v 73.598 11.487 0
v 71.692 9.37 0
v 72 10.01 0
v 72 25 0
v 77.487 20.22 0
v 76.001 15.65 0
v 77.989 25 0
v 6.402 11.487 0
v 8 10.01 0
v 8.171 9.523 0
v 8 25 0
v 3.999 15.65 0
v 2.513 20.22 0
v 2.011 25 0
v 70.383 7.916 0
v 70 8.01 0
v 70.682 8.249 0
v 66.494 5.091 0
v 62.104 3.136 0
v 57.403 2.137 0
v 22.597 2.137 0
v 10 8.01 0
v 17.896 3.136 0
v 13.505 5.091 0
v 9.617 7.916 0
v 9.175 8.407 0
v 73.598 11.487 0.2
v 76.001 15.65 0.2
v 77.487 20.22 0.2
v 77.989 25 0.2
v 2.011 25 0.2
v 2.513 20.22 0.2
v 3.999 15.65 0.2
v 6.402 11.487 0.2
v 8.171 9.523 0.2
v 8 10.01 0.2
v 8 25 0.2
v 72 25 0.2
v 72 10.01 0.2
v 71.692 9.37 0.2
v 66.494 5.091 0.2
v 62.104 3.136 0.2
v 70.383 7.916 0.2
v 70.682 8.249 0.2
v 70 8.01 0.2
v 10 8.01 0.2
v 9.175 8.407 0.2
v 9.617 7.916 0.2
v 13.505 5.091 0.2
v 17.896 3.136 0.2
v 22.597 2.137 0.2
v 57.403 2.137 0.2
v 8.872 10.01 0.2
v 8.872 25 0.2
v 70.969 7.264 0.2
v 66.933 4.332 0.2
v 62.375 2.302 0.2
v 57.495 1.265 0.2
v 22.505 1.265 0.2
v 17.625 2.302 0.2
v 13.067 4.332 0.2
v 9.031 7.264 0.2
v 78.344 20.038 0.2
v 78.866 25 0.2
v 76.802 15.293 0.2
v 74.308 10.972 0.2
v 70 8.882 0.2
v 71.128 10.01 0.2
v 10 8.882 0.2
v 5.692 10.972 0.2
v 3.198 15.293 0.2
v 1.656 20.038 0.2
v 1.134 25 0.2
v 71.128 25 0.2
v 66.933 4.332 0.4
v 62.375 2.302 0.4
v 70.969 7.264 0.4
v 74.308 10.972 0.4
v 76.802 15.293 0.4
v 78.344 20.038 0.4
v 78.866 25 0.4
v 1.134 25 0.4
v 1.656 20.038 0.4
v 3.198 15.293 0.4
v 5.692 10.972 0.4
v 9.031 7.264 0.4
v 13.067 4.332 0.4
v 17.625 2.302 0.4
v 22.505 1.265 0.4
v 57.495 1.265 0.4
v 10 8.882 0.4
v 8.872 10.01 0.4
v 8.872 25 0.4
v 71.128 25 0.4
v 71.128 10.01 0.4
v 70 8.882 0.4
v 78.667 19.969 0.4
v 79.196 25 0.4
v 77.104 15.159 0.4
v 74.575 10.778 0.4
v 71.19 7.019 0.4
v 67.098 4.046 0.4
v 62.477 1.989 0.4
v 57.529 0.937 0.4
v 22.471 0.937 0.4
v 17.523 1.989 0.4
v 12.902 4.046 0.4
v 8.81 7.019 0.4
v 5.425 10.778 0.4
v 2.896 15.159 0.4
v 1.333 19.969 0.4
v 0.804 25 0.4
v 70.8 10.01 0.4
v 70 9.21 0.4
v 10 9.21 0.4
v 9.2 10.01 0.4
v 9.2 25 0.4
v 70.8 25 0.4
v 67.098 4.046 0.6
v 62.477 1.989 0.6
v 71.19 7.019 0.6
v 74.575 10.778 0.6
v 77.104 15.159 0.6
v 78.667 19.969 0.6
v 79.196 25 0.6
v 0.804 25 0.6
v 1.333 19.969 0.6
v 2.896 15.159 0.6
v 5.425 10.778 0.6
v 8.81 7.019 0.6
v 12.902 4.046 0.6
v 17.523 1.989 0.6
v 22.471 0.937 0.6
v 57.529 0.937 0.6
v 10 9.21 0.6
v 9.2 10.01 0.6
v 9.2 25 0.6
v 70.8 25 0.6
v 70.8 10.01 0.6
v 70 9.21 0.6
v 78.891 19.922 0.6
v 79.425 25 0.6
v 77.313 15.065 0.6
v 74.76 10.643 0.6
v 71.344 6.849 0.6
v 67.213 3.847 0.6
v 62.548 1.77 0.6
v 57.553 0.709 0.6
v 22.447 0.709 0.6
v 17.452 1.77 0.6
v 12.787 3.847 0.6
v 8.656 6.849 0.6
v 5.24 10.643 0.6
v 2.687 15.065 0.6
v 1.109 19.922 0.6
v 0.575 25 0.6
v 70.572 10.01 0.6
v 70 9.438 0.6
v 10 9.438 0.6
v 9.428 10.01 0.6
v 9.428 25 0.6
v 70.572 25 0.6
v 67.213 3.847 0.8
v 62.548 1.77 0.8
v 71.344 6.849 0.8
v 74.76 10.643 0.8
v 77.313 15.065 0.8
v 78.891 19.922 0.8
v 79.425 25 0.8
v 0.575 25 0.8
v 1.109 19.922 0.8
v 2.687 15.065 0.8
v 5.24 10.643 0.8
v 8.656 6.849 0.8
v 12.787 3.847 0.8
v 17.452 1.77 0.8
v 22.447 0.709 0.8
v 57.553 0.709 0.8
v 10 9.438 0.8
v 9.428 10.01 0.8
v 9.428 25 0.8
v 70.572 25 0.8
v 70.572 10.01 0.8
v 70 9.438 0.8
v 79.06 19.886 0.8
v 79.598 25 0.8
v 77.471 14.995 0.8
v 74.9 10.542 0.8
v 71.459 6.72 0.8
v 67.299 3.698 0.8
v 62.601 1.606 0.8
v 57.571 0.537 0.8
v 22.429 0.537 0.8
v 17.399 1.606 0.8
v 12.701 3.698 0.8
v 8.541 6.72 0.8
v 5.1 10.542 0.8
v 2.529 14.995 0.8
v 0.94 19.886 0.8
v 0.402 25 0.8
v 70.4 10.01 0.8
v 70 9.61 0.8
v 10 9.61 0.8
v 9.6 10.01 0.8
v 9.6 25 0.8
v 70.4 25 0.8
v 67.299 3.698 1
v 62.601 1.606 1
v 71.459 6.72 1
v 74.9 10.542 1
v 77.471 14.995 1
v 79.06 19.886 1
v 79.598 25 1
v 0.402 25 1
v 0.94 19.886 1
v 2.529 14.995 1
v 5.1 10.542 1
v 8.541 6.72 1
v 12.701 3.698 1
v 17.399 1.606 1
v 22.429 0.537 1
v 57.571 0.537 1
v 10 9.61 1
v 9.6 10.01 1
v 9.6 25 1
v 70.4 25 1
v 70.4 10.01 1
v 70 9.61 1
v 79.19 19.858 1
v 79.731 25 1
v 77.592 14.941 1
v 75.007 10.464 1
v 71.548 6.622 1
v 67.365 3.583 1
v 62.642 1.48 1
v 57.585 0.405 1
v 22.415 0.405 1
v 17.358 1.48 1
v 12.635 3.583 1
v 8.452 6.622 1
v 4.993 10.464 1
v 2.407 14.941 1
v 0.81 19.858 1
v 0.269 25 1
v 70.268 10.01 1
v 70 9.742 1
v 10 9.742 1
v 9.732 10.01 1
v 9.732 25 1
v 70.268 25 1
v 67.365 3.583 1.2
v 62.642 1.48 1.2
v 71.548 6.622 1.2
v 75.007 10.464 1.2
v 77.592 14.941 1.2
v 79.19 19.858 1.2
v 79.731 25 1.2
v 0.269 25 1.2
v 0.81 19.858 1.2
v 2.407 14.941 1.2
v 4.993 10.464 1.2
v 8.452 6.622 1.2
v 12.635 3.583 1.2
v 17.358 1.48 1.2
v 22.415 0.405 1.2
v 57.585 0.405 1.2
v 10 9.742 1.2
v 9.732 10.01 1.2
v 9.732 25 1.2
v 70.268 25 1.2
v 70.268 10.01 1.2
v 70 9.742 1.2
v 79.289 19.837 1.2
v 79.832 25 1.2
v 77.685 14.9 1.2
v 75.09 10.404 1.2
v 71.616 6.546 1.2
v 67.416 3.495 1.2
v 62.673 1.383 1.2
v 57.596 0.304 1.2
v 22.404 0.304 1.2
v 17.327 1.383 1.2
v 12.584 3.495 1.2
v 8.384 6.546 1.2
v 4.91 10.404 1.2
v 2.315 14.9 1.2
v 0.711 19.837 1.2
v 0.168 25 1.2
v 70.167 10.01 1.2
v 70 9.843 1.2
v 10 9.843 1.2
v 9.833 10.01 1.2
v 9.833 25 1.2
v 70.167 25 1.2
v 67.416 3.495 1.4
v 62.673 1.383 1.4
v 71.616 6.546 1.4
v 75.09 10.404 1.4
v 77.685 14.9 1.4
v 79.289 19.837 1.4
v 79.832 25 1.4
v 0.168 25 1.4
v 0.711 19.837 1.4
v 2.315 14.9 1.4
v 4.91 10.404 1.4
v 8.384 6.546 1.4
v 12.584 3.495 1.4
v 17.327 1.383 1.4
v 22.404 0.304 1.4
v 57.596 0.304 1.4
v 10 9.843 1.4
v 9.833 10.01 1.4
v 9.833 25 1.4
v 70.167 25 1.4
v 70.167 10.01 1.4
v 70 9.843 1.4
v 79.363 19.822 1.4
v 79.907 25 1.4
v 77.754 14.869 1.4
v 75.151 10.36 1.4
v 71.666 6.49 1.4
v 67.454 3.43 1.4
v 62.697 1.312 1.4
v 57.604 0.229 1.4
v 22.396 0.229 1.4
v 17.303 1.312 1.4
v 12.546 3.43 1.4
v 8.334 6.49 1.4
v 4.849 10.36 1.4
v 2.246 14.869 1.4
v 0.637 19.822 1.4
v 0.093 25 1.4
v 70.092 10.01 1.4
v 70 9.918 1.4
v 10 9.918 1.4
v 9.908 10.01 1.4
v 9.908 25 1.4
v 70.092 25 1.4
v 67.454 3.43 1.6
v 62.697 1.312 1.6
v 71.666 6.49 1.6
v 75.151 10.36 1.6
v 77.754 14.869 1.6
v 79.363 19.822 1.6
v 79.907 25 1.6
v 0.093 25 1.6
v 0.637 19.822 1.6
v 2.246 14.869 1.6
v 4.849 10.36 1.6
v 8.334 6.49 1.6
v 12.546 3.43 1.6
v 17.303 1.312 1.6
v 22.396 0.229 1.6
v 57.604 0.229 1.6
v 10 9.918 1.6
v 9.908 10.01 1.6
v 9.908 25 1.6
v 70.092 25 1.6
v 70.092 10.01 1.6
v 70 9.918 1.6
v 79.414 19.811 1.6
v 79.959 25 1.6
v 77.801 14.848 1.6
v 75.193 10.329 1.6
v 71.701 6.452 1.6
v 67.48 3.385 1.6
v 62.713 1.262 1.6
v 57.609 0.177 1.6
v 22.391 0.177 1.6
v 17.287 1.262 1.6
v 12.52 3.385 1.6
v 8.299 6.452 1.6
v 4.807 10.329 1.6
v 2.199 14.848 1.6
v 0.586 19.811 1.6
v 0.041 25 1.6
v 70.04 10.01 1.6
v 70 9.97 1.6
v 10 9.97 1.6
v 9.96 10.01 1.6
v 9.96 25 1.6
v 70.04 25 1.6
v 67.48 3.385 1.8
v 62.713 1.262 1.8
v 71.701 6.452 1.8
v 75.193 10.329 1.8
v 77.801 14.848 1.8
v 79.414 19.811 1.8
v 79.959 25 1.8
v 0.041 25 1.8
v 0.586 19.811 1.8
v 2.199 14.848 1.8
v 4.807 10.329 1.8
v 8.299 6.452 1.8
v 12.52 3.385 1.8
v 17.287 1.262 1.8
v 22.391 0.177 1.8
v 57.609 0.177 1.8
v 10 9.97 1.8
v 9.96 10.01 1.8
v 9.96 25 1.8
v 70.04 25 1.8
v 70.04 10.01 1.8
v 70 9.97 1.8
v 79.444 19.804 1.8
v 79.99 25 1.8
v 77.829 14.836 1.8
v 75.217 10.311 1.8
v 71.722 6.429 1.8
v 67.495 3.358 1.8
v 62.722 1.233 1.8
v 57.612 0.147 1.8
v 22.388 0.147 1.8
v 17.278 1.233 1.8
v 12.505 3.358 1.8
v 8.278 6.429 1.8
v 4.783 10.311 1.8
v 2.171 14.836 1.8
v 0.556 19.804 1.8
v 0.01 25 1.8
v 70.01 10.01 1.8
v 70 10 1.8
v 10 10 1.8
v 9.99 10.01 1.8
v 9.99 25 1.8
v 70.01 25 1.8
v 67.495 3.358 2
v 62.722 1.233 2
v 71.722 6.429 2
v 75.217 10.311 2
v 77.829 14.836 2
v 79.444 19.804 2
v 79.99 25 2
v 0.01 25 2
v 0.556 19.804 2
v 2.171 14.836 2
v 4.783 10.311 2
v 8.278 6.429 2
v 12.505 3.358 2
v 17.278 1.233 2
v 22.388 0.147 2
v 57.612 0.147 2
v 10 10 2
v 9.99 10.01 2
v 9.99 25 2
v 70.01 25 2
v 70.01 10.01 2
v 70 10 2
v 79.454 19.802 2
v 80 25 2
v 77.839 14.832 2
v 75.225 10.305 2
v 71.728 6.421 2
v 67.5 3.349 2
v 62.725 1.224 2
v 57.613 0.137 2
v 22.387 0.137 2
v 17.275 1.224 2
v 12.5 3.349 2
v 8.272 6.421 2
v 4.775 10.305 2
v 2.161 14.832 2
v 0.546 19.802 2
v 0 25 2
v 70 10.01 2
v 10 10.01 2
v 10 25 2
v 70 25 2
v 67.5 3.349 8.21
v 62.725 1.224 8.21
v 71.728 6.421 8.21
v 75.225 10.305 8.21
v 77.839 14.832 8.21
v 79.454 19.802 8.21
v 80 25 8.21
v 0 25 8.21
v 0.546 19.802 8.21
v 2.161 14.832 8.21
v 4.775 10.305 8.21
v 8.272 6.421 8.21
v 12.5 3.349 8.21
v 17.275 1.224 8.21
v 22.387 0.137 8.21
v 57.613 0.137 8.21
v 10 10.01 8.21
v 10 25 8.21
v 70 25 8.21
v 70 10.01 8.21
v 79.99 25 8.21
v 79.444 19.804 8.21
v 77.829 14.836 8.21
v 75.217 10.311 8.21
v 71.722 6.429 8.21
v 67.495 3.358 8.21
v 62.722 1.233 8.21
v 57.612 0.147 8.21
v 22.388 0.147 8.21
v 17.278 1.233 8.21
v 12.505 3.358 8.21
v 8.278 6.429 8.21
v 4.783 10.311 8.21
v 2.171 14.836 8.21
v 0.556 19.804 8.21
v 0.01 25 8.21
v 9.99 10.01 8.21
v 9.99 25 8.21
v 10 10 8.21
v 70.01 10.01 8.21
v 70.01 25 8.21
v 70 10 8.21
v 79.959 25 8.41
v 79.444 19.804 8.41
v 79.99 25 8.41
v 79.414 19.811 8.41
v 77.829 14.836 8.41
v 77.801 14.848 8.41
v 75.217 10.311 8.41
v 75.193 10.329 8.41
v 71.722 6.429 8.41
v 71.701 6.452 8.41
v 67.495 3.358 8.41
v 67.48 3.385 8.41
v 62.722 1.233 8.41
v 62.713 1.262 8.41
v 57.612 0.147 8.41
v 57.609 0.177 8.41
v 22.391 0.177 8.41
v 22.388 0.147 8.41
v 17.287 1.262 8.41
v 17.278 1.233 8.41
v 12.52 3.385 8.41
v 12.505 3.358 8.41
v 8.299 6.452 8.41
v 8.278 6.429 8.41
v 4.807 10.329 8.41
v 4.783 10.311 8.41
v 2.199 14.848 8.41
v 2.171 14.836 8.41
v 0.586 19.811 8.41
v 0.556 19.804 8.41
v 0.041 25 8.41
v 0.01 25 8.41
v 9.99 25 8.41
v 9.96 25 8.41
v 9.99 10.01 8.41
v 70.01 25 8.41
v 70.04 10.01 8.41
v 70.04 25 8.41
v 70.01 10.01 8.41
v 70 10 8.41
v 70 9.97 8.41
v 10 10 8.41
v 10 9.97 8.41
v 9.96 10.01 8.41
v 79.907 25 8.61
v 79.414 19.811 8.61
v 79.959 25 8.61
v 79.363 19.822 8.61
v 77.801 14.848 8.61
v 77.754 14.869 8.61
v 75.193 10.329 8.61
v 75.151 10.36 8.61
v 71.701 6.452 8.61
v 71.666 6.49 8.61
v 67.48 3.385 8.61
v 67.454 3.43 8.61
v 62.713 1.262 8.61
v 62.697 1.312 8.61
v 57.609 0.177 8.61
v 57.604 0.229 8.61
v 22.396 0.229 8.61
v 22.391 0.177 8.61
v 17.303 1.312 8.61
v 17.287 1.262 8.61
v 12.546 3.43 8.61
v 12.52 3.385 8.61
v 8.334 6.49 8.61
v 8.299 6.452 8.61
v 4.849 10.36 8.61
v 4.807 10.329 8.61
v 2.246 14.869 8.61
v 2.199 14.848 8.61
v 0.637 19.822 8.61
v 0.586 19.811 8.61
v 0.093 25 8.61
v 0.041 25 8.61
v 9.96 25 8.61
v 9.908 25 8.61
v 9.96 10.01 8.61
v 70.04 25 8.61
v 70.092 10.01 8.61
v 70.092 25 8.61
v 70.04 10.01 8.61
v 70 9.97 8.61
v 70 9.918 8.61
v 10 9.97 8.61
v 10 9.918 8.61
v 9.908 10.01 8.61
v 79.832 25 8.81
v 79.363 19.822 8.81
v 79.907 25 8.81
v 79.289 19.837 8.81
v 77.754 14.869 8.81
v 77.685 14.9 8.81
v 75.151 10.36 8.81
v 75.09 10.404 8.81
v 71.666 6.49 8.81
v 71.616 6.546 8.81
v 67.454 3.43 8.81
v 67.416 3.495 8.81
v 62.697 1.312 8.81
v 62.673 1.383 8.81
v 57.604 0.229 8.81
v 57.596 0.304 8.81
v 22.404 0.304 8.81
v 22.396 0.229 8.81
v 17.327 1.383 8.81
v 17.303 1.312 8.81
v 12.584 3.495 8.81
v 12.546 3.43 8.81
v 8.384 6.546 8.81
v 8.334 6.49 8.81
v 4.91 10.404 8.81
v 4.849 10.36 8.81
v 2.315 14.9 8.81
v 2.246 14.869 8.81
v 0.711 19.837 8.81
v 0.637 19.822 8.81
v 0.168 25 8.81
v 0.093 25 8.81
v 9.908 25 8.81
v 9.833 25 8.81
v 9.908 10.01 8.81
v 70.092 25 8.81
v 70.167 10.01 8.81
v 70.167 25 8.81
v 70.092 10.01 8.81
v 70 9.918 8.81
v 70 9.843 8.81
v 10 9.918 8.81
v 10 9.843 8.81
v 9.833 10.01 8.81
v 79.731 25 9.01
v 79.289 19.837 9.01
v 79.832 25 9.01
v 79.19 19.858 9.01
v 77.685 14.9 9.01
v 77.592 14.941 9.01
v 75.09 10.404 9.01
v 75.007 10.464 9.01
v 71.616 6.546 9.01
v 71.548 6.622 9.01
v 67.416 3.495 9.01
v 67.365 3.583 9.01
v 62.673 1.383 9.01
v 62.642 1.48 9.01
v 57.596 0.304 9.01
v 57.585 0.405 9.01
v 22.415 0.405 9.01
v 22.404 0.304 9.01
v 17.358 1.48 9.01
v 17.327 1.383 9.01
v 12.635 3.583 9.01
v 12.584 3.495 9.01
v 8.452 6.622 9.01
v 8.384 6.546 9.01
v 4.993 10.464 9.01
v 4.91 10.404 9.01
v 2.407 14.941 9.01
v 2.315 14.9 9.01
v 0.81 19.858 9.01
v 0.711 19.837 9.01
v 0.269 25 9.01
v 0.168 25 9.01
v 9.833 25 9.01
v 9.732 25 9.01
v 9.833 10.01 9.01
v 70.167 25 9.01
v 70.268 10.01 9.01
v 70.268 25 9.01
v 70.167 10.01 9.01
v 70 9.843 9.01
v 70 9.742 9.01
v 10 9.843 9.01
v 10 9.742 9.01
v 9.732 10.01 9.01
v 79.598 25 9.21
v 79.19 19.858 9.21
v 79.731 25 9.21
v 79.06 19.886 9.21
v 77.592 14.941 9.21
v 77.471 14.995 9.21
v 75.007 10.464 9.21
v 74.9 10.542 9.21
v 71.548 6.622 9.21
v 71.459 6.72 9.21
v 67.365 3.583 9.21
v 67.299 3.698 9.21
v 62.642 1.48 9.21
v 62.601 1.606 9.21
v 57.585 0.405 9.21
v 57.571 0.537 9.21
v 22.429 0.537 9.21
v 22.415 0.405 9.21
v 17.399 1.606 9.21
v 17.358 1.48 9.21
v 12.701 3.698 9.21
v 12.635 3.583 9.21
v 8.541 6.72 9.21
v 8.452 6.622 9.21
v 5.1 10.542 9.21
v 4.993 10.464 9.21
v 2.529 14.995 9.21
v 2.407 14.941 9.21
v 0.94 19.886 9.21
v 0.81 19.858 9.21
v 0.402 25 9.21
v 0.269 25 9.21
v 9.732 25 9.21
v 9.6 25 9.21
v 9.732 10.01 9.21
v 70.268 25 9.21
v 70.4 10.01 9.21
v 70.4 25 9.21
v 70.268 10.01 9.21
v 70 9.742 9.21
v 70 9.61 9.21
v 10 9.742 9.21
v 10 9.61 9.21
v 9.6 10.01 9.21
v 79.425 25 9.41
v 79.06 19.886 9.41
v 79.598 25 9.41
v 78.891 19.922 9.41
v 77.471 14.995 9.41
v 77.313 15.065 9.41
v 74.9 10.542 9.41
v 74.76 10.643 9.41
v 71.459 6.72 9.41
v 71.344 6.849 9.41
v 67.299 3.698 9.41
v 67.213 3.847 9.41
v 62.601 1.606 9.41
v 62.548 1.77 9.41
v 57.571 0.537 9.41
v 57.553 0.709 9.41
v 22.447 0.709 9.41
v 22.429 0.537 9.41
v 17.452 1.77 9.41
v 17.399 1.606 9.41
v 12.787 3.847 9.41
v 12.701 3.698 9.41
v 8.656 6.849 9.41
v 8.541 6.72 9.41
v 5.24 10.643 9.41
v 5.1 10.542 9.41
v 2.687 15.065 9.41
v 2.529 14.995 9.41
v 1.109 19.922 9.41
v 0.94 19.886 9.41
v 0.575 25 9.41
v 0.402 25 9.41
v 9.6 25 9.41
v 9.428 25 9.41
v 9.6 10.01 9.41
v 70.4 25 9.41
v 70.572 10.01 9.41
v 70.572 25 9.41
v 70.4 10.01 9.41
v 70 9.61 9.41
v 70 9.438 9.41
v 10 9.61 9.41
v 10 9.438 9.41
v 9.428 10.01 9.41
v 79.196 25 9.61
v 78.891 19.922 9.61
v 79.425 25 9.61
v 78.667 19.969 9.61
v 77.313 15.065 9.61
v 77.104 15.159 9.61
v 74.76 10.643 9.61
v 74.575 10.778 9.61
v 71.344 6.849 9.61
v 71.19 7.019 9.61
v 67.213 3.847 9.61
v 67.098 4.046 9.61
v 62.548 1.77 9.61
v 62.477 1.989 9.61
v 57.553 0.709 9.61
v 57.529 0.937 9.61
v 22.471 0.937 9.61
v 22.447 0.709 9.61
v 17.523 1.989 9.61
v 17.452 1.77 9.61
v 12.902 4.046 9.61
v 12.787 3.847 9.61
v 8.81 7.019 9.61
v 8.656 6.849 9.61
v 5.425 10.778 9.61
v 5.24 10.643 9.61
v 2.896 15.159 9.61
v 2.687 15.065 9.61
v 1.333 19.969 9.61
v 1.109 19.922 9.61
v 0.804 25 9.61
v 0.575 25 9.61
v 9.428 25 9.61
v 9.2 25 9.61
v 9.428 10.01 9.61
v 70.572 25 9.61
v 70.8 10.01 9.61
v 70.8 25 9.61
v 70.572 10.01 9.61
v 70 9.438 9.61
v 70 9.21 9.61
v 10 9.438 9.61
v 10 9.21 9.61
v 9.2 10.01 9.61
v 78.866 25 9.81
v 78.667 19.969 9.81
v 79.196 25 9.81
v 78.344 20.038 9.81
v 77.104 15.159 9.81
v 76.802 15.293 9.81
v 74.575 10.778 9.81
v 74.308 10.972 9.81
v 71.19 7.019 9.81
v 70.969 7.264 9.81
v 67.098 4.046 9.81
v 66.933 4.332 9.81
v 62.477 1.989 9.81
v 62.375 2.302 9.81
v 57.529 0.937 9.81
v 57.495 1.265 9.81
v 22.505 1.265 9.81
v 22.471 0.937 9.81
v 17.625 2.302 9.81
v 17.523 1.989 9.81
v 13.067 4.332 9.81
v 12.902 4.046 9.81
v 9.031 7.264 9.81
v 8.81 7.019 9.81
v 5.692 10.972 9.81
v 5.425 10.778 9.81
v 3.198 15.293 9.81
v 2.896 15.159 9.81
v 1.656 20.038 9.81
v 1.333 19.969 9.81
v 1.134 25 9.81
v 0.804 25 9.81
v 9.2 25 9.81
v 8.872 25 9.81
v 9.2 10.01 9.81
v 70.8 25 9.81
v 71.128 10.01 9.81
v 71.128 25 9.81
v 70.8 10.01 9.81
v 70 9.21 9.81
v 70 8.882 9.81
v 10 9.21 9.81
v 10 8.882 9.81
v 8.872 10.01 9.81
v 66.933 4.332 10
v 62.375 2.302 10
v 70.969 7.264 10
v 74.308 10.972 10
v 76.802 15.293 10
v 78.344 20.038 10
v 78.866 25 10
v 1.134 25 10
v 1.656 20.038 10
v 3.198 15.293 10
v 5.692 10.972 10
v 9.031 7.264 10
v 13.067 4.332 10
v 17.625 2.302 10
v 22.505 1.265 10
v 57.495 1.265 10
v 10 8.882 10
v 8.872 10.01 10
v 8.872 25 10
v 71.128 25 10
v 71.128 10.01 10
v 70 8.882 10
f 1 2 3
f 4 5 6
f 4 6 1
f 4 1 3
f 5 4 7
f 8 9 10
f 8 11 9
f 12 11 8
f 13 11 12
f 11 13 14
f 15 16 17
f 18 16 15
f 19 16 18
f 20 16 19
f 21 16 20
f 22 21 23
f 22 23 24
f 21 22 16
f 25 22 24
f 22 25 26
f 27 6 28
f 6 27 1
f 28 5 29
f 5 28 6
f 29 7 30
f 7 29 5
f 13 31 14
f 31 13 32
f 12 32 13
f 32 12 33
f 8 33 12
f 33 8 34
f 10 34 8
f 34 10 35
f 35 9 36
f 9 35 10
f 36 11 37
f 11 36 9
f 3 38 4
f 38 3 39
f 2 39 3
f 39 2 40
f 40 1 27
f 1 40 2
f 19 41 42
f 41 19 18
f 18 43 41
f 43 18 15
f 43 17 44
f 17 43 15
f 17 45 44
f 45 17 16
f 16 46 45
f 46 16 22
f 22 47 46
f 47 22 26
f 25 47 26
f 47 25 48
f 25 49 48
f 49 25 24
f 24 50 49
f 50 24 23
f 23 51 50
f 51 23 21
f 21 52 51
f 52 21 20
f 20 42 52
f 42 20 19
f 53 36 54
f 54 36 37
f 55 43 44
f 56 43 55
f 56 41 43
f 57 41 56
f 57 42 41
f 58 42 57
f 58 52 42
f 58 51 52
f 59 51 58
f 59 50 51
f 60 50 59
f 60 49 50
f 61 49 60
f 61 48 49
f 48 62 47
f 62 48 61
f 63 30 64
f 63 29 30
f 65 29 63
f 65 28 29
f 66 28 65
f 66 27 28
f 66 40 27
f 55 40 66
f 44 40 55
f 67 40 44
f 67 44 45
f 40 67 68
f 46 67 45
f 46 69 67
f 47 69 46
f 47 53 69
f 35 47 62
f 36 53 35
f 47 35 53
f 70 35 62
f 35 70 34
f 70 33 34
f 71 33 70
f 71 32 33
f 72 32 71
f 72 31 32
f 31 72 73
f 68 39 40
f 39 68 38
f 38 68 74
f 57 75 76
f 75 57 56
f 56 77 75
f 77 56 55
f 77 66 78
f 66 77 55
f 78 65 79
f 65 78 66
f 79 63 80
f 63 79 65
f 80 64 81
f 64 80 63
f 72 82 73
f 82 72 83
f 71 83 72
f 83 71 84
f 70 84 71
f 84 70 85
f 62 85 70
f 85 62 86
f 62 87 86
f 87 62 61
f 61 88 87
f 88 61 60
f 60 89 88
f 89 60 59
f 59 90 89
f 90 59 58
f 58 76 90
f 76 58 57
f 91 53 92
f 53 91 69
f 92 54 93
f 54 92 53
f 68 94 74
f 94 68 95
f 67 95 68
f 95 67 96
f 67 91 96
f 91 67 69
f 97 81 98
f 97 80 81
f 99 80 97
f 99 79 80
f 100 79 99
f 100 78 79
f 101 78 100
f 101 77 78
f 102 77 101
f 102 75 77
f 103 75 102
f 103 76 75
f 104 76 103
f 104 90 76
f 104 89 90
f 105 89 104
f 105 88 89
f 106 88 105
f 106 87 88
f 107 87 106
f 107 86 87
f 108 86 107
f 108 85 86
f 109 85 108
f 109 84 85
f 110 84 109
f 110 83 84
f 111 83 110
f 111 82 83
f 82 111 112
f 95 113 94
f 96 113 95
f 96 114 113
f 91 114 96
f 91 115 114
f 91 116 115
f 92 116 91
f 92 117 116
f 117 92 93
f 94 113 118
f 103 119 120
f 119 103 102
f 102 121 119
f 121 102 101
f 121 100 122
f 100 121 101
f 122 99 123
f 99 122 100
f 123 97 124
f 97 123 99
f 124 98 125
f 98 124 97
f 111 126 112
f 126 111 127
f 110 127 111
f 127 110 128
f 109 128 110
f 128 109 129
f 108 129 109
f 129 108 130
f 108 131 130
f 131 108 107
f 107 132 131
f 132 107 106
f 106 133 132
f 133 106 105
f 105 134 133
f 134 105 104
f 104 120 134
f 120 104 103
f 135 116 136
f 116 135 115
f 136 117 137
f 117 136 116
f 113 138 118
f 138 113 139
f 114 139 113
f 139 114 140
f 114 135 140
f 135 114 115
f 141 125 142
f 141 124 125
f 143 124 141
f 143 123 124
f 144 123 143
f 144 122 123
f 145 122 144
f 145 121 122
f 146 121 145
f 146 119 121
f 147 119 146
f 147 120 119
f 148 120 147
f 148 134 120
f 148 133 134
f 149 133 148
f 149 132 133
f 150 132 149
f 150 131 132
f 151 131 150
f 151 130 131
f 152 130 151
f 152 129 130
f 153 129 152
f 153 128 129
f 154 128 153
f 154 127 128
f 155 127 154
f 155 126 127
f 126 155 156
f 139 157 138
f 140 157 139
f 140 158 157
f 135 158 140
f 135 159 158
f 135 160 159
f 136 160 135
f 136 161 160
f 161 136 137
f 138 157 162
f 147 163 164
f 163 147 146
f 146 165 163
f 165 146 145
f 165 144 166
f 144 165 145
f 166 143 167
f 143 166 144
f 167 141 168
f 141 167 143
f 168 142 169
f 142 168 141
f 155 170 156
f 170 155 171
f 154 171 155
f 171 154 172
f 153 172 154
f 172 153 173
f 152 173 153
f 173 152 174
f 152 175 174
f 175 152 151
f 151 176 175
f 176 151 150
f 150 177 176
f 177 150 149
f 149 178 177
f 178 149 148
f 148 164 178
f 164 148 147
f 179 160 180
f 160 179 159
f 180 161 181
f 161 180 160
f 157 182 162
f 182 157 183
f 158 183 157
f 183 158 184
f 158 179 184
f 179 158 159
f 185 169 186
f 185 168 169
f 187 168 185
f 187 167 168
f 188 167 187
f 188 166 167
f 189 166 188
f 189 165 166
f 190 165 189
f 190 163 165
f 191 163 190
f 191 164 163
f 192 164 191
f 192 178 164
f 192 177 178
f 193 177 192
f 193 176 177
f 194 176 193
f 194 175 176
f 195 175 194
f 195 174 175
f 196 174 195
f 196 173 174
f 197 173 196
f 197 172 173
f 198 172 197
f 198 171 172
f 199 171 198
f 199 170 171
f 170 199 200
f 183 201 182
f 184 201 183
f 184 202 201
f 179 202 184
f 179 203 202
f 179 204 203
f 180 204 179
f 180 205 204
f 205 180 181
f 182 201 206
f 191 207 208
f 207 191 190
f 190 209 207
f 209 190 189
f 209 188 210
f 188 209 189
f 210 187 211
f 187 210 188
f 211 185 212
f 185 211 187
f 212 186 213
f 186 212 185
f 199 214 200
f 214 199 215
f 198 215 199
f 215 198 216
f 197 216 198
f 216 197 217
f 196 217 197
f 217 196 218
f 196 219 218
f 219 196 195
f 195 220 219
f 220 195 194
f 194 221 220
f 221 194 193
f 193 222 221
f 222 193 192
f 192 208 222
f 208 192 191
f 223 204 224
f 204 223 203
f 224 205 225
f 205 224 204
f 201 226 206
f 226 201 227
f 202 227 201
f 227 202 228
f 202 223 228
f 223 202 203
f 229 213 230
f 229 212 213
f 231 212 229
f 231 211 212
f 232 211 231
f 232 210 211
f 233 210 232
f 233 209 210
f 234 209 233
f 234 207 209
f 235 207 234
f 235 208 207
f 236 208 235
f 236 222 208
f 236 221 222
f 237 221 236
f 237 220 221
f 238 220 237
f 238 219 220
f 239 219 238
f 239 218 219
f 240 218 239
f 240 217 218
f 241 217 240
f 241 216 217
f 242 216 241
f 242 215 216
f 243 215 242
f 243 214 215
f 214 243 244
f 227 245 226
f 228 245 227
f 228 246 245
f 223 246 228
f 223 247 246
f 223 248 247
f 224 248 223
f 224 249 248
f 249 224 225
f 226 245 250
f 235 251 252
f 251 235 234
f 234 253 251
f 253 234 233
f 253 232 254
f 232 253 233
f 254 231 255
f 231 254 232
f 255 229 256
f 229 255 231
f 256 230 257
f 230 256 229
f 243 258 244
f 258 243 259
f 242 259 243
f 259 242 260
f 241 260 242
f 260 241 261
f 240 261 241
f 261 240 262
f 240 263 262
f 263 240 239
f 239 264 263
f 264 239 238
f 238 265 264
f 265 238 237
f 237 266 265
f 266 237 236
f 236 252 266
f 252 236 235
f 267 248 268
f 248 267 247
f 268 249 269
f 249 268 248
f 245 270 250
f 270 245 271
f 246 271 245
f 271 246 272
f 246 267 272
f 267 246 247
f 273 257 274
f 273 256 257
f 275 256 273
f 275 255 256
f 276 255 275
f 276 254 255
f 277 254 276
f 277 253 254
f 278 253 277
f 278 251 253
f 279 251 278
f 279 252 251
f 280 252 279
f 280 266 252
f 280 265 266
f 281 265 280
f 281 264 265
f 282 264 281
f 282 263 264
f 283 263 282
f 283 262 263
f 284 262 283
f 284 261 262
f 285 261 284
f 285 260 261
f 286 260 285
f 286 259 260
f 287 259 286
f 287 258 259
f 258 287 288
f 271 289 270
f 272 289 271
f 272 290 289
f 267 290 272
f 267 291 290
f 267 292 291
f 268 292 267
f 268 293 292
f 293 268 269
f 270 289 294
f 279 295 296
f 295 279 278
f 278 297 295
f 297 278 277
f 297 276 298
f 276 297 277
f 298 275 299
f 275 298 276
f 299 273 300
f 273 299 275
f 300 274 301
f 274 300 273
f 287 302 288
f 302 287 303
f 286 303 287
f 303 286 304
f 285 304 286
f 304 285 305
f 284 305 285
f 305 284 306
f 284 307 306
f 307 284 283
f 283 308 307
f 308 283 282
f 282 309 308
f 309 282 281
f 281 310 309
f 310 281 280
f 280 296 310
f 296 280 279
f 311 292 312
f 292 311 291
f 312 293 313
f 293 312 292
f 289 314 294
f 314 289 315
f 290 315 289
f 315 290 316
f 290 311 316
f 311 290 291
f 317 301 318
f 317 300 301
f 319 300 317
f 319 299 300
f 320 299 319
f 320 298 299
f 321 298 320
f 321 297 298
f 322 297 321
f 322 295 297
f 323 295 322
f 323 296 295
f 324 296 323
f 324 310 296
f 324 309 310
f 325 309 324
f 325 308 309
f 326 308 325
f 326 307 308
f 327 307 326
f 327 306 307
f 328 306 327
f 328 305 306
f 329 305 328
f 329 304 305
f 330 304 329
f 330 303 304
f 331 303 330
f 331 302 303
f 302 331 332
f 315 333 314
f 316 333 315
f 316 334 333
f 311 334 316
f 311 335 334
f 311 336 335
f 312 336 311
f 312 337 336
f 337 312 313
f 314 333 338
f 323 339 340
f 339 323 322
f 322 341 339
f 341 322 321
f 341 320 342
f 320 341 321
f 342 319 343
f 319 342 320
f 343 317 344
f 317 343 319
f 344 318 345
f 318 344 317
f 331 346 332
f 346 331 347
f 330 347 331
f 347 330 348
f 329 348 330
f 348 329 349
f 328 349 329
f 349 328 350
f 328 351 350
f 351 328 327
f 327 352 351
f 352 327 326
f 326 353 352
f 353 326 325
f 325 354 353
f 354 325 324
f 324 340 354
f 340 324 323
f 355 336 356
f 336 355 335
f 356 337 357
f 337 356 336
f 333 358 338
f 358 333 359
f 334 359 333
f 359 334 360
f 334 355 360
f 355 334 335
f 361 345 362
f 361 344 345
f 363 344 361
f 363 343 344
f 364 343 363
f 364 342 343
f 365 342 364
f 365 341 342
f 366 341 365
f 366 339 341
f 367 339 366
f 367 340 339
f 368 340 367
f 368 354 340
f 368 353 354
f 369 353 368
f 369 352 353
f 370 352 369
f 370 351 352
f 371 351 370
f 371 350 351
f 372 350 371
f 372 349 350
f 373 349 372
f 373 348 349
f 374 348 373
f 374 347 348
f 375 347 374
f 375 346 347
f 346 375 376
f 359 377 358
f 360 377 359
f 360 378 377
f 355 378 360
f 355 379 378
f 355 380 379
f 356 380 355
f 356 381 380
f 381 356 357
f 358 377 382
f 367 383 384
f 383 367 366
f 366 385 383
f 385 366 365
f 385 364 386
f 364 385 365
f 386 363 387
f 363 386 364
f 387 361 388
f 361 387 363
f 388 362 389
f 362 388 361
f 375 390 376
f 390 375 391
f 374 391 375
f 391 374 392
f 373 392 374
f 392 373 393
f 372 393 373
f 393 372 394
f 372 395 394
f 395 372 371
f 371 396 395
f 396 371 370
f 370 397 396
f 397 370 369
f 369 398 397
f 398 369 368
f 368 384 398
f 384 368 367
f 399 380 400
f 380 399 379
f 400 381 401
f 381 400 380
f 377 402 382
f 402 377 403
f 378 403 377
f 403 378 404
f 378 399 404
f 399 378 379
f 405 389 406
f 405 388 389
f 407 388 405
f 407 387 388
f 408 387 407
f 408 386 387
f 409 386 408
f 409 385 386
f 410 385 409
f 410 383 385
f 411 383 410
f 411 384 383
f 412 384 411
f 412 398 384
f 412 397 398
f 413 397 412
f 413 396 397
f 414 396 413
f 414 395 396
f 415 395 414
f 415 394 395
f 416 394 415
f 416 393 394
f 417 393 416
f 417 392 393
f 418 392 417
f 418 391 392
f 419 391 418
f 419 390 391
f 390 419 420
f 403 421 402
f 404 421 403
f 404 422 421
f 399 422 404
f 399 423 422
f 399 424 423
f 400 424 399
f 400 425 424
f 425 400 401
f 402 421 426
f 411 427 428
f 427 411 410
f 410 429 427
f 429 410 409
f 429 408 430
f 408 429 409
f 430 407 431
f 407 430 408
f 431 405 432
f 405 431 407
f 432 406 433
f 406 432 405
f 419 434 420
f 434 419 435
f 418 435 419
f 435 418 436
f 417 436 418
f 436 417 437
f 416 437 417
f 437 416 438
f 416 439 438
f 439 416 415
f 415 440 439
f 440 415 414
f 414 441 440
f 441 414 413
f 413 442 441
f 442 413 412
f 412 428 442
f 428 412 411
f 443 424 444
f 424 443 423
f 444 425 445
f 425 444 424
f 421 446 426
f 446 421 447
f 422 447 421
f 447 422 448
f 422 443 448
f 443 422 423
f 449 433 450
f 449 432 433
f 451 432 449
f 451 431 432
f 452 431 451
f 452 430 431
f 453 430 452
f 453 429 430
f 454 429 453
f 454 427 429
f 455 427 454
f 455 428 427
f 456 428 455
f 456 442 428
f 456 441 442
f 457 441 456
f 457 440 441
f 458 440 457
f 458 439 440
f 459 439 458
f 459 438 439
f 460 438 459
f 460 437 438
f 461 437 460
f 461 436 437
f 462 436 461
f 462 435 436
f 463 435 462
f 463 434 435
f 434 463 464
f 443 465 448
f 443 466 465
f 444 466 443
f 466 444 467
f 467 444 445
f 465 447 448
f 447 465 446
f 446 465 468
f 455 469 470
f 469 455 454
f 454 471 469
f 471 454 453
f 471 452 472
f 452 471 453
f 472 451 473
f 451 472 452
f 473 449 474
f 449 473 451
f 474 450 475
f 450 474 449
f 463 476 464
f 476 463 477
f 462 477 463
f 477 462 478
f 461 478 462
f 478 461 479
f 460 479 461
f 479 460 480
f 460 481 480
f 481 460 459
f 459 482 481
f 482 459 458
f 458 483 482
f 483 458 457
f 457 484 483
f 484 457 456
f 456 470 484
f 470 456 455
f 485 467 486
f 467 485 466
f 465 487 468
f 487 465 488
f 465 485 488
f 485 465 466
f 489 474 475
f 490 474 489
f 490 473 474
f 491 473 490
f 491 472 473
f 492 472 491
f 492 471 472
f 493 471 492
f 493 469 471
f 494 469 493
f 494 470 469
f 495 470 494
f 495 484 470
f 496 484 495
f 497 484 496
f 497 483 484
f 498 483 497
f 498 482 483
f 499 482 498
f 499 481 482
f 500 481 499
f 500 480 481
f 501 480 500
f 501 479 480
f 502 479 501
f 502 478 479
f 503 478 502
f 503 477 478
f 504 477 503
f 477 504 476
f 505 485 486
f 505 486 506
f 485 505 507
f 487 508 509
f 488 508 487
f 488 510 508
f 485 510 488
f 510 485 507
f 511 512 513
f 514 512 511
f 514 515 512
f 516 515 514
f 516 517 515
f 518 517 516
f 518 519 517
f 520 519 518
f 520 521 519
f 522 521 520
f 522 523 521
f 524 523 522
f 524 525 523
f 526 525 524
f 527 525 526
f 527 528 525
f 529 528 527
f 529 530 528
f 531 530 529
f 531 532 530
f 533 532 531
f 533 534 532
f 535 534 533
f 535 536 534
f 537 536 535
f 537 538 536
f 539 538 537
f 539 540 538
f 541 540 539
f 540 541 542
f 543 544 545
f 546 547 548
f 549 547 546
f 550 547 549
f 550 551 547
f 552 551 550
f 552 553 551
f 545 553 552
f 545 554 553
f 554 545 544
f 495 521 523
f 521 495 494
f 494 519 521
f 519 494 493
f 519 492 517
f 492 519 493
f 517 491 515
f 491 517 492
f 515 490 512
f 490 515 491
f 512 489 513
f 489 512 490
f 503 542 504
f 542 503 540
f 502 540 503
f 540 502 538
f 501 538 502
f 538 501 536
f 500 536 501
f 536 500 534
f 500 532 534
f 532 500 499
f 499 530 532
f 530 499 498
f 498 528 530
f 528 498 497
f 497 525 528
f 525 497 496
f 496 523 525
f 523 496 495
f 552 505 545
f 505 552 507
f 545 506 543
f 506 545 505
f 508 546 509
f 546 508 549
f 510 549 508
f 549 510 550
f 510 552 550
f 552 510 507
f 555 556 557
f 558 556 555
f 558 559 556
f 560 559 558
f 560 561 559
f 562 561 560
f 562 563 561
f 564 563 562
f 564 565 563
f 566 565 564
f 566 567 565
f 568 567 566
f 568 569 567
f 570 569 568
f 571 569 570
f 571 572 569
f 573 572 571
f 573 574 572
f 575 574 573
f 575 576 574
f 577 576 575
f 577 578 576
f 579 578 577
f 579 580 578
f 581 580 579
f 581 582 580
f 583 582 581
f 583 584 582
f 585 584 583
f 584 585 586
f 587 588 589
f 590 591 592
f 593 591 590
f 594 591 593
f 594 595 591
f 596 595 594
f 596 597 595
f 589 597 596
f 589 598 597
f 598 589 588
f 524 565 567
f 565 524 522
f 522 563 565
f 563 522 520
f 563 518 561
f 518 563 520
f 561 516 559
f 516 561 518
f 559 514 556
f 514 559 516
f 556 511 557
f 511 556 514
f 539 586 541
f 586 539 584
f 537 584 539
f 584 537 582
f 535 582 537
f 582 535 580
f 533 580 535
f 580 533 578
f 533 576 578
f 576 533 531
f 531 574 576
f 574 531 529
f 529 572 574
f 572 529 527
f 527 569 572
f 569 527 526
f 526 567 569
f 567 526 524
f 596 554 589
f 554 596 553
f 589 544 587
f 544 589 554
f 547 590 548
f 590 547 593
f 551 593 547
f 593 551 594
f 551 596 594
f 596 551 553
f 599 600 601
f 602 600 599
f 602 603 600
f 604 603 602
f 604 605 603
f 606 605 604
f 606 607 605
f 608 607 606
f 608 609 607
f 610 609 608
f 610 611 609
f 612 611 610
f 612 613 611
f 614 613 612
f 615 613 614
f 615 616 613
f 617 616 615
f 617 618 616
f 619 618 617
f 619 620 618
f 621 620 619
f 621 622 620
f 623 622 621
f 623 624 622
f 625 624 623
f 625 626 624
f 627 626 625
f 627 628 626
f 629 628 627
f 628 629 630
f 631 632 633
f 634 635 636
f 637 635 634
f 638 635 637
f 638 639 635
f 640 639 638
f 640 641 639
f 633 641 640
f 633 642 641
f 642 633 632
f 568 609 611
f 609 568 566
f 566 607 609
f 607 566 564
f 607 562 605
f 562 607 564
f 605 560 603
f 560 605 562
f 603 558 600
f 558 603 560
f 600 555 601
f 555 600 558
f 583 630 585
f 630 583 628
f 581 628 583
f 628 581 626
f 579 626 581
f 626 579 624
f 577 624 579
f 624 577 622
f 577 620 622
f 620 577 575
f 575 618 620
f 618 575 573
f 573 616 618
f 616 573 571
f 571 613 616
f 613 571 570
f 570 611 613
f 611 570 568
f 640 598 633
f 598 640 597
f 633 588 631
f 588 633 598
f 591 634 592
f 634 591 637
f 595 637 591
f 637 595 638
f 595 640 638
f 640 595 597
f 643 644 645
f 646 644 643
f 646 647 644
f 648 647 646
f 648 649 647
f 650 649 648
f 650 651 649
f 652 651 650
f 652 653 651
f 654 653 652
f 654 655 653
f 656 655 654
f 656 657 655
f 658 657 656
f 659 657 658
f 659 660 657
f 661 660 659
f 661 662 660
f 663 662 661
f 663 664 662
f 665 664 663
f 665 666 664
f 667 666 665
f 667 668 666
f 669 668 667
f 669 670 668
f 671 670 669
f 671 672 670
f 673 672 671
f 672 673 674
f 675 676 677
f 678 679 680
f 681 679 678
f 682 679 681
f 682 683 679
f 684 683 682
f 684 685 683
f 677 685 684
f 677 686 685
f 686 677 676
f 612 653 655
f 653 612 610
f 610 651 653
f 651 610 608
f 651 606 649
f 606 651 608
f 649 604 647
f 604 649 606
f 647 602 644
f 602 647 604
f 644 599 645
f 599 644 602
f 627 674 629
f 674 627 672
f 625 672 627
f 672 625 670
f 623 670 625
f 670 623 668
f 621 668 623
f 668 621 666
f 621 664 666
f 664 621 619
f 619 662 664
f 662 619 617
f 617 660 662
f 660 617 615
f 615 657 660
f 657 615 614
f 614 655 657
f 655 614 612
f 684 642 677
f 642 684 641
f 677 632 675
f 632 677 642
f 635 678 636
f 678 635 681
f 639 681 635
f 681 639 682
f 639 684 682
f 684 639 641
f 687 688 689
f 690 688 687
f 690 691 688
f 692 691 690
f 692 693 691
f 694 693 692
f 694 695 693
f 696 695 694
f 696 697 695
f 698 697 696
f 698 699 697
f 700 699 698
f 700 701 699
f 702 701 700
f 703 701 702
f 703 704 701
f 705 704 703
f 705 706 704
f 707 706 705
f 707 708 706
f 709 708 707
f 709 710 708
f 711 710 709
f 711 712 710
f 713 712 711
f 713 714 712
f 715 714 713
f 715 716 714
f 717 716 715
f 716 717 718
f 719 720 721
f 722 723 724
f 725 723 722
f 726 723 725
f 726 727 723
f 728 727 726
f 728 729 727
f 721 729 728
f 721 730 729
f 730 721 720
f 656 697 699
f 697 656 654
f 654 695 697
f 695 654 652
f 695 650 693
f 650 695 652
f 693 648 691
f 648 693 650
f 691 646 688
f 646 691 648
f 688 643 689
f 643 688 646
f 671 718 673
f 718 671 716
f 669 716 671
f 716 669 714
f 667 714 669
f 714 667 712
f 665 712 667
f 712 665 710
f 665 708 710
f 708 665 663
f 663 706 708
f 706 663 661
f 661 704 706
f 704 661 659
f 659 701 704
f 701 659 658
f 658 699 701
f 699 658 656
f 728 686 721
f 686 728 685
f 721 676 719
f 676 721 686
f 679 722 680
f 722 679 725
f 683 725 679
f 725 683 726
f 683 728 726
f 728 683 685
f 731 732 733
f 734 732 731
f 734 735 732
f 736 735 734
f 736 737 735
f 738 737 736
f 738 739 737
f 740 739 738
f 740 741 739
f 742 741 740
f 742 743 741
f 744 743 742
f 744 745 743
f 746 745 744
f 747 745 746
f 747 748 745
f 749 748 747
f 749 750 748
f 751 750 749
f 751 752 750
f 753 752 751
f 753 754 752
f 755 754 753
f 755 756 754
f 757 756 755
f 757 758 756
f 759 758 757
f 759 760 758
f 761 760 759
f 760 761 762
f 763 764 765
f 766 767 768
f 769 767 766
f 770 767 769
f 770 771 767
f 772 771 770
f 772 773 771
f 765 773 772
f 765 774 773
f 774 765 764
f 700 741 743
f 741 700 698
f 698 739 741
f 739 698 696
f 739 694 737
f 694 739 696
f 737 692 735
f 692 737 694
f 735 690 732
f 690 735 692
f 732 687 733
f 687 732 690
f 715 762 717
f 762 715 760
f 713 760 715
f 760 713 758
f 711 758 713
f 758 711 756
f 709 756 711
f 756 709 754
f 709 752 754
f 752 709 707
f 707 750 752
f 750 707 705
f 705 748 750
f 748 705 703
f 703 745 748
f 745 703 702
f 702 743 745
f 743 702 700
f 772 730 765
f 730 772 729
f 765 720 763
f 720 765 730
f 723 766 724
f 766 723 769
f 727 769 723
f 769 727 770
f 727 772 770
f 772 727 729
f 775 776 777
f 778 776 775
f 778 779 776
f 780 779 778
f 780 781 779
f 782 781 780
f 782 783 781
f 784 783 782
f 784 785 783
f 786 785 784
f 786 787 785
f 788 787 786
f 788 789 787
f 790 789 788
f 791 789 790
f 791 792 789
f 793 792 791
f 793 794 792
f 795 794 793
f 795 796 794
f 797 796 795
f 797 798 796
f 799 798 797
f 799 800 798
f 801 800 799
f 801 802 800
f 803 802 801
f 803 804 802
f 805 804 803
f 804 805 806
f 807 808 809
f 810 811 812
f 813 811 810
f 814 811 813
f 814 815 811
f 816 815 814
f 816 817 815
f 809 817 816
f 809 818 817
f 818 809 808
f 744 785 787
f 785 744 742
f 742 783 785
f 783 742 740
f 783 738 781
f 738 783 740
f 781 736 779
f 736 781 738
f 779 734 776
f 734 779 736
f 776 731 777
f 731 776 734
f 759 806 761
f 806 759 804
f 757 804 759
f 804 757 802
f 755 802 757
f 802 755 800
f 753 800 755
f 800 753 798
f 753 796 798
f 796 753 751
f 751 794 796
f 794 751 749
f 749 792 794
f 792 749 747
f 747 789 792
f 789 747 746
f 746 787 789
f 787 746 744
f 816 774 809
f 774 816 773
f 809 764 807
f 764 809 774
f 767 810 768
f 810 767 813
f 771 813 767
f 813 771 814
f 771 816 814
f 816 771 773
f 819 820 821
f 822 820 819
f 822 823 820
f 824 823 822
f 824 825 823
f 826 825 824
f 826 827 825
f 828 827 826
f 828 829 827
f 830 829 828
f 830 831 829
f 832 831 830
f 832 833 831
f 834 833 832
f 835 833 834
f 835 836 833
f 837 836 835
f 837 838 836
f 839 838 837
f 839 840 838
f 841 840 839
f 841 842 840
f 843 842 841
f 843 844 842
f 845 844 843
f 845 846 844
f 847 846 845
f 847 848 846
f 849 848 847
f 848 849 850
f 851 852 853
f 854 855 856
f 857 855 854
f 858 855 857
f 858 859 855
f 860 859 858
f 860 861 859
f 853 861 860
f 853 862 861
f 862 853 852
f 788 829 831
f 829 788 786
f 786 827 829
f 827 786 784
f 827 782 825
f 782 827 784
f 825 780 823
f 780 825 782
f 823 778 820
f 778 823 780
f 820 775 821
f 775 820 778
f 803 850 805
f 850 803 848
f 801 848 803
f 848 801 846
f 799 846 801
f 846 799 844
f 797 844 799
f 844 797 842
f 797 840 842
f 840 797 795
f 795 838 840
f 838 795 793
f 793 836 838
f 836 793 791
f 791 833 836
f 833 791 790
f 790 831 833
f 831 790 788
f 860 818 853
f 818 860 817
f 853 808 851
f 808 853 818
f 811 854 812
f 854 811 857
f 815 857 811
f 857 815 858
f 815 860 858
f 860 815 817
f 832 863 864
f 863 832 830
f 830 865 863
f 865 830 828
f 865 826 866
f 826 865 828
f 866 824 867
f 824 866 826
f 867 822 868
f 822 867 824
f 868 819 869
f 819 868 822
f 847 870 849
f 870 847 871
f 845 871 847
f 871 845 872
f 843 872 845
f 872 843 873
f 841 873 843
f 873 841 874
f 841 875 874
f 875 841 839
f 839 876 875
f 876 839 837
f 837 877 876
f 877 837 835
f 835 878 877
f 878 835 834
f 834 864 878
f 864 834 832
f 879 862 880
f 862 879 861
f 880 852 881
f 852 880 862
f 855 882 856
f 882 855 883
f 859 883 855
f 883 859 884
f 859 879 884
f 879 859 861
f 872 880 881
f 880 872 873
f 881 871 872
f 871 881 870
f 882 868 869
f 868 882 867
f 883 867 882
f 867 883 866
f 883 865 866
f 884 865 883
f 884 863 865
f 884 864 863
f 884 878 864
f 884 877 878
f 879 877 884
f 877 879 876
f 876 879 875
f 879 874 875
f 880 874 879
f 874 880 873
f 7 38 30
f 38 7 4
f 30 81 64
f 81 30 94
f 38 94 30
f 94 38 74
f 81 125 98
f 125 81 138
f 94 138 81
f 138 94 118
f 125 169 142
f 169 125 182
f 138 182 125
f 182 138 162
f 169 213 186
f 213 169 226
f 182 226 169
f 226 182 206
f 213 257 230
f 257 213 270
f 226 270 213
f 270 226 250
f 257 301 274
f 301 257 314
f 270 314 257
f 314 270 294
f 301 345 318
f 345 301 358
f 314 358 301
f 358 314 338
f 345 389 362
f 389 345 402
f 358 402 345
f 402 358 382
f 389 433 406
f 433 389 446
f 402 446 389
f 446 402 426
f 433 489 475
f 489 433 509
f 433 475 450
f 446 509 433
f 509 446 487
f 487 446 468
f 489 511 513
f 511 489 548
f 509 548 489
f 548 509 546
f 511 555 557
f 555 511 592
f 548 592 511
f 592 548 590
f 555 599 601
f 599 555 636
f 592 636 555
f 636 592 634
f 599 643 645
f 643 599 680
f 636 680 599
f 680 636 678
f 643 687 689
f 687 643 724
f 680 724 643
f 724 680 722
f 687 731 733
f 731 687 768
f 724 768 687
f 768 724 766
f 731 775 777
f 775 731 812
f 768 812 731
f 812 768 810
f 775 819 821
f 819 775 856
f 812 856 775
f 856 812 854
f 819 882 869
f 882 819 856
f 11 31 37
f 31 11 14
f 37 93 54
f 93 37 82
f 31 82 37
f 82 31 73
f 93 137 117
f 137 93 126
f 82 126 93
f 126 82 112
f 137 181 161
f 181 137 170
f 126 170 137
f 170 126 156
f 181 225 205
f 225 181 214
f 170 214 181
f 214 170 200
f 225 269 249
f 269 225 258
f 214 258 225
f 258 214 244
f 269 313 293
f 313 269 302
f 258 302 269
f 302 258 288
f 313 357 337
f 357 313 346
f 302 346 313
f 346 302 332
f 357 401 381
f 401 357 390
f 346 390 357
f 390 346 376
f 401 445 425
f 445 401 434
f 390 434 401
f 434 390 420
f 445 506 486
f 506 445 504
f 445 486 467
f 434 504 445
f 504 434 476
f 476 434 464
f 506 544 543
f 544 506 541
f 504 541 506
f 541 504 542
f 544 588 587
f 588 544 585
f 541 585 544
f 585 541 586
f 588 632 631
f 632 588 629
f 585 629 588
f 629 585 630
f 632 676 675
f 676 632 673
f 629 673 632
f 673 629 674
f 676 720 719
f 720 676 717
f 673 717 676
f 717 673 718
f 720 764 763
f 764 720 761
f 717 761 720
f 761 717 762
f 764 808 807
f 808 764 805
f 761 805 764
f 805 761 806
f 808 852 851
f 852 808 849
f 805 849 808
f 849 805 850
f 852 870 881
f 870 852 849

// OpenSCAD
nothing=0.01;

module rounded_linear_extrude(depth, radius, slices=50) {
    // Slice from 0...radius,             use 'offset'
    // Slice from radius..(depth-radius), just flat
    // Slice from (depth-radius)..radius, use 'offset'
    slice_thickness = depth/slices;
    union() {
        for (dz = [0:slice_thickness:depth]) {
            translate([0,0,dz])
            linear_extrude(slice_thickness+nothing)
            rounded_linear_extrude_crossection(depth, radius, dz) children();
        }
    }
}
module rounded_linear_extrude_crossection(depth, radius, dz) {
    d_end = (dz >= depth-radius) ? depth-dz-radius : (
        (dz <= radius) ? dz-radius : 0
    );
    
    // Rounded chamfer, not triangular
    inset = sqrt(radius*radius-d_end*d_end)-radius;
    
    offset(inset)
    children();
}

module handle(width, length, cutout_width, cutout_length, thickness, rounding) {
    intersection() {
        cube([length, width, thickness]);
        //linear_extrude(thickness) {
        rounded_linear_extrude(thickness, rounding) {
            difference() {
                hull() {
                    translate([width,width, 0])
                    circle(r=width);
                    translate([length-width,width, 0])
                    circle(r=width);
                }
            
                translate([length/2-cutout_length/2, width-cutout_width+nothing])
                square([cutout_length, cutout_width]);
            }
        }
    }
}

handle(width=25, length=80, 
       cutout_width=15, cutout_length=60,
       thickness=10, rounding=2);
